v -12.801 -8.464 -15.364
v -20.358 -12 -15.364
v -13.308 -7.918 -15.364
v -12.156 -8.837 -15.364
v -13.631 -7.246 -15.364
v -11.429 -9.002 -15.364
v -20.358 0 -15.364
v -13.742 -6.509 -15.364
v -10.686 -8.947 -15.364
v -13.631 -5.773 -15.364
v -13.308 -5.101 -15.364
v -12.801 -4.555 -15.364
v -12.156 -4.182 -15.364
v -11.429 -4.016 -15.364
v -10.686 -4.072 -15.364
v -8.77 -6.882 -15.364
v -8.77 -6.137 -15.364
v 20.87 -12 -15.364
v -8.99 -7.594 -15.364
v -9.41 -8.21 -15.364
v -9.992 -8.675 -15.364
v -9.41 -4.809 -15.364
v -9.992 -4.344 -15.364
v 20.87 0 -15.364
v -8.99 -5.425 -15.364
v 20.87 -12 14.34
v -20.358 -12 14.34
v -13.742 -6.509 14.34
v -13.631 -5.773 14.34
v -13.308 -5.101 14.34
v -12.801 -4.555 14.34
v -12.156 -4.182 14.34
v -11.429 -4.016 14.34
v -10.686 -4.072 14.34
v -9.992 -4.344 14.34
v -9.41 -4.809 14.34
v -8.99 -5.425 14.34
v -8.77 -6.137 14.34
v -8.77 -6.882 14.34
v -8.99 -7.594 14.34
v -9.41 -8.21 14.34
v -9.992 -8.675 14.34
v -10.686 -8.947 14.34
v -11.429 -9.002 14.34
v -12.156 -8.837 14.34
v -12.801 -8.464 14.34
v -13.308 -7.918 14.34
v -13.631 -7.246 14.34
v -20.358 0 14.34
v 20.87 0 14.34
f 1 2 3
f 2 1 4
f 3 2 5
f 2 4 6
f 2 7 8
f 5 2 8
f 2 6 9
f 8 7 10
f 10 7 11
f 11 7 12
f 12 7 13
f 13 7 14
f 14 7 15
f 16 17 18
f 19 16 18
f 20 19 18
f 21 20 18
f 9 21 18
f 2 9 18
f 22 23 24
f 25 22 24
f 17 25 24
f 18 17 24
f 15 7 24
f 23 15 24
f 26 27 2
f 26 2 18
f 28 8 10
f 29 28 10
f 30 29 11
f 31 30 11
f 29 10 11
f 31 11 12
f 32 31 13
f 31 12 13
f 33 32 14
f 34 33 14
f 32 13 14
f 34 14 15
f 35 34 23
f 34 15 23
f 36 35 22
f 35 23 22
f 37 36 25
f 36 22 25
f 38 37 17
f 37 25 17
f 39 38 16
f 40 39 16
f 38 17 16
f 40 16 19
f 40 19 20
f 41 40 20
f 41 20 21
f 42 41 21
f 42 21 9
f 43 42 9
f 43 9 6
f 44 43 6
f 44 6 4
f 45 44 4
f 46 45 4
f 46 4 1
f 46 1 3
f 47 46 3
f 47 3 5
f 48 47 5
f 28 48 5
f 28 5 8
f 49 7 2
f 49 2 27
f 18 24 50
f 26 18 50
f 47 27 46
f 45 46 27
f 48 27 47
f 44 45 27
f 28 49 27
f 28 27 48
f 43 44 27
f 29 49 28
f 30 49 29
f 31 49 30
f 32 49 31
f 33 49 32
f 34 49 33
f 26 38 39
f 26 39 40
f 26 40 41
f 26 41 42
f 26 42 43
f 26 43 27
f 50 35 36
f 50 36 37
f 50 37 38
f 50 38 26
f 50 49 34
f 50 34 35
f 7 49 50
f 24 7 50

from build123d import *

# Parameters (mm, degrees)
F0_W     = 41.2274915725
F0_H     = 29.704278335
F2_DEPTH = 12
F5_D     = 5


# Not quite as in the source:
# - the program builds the solid bodies; features that only make, move or delete a surface that nothing else refers to are left out


with BuildPart() as f2:
    # F0 (on Front) → F2 (new body)
    with BuildSketch(Plane.XZ):
        with Locations((0.2560736611, -0.512146391)):
            Rectangle(F0_W, F0_H)
    extrude(amount=F2_DEPTH)

    # F5 (through all)
    with Locations(Plane.XY.offset(14.3399927765)):
        with Locations((-11.2421652302, -6.5094744787)):
            Hole(F5_D / 2)


solid = f2.part
